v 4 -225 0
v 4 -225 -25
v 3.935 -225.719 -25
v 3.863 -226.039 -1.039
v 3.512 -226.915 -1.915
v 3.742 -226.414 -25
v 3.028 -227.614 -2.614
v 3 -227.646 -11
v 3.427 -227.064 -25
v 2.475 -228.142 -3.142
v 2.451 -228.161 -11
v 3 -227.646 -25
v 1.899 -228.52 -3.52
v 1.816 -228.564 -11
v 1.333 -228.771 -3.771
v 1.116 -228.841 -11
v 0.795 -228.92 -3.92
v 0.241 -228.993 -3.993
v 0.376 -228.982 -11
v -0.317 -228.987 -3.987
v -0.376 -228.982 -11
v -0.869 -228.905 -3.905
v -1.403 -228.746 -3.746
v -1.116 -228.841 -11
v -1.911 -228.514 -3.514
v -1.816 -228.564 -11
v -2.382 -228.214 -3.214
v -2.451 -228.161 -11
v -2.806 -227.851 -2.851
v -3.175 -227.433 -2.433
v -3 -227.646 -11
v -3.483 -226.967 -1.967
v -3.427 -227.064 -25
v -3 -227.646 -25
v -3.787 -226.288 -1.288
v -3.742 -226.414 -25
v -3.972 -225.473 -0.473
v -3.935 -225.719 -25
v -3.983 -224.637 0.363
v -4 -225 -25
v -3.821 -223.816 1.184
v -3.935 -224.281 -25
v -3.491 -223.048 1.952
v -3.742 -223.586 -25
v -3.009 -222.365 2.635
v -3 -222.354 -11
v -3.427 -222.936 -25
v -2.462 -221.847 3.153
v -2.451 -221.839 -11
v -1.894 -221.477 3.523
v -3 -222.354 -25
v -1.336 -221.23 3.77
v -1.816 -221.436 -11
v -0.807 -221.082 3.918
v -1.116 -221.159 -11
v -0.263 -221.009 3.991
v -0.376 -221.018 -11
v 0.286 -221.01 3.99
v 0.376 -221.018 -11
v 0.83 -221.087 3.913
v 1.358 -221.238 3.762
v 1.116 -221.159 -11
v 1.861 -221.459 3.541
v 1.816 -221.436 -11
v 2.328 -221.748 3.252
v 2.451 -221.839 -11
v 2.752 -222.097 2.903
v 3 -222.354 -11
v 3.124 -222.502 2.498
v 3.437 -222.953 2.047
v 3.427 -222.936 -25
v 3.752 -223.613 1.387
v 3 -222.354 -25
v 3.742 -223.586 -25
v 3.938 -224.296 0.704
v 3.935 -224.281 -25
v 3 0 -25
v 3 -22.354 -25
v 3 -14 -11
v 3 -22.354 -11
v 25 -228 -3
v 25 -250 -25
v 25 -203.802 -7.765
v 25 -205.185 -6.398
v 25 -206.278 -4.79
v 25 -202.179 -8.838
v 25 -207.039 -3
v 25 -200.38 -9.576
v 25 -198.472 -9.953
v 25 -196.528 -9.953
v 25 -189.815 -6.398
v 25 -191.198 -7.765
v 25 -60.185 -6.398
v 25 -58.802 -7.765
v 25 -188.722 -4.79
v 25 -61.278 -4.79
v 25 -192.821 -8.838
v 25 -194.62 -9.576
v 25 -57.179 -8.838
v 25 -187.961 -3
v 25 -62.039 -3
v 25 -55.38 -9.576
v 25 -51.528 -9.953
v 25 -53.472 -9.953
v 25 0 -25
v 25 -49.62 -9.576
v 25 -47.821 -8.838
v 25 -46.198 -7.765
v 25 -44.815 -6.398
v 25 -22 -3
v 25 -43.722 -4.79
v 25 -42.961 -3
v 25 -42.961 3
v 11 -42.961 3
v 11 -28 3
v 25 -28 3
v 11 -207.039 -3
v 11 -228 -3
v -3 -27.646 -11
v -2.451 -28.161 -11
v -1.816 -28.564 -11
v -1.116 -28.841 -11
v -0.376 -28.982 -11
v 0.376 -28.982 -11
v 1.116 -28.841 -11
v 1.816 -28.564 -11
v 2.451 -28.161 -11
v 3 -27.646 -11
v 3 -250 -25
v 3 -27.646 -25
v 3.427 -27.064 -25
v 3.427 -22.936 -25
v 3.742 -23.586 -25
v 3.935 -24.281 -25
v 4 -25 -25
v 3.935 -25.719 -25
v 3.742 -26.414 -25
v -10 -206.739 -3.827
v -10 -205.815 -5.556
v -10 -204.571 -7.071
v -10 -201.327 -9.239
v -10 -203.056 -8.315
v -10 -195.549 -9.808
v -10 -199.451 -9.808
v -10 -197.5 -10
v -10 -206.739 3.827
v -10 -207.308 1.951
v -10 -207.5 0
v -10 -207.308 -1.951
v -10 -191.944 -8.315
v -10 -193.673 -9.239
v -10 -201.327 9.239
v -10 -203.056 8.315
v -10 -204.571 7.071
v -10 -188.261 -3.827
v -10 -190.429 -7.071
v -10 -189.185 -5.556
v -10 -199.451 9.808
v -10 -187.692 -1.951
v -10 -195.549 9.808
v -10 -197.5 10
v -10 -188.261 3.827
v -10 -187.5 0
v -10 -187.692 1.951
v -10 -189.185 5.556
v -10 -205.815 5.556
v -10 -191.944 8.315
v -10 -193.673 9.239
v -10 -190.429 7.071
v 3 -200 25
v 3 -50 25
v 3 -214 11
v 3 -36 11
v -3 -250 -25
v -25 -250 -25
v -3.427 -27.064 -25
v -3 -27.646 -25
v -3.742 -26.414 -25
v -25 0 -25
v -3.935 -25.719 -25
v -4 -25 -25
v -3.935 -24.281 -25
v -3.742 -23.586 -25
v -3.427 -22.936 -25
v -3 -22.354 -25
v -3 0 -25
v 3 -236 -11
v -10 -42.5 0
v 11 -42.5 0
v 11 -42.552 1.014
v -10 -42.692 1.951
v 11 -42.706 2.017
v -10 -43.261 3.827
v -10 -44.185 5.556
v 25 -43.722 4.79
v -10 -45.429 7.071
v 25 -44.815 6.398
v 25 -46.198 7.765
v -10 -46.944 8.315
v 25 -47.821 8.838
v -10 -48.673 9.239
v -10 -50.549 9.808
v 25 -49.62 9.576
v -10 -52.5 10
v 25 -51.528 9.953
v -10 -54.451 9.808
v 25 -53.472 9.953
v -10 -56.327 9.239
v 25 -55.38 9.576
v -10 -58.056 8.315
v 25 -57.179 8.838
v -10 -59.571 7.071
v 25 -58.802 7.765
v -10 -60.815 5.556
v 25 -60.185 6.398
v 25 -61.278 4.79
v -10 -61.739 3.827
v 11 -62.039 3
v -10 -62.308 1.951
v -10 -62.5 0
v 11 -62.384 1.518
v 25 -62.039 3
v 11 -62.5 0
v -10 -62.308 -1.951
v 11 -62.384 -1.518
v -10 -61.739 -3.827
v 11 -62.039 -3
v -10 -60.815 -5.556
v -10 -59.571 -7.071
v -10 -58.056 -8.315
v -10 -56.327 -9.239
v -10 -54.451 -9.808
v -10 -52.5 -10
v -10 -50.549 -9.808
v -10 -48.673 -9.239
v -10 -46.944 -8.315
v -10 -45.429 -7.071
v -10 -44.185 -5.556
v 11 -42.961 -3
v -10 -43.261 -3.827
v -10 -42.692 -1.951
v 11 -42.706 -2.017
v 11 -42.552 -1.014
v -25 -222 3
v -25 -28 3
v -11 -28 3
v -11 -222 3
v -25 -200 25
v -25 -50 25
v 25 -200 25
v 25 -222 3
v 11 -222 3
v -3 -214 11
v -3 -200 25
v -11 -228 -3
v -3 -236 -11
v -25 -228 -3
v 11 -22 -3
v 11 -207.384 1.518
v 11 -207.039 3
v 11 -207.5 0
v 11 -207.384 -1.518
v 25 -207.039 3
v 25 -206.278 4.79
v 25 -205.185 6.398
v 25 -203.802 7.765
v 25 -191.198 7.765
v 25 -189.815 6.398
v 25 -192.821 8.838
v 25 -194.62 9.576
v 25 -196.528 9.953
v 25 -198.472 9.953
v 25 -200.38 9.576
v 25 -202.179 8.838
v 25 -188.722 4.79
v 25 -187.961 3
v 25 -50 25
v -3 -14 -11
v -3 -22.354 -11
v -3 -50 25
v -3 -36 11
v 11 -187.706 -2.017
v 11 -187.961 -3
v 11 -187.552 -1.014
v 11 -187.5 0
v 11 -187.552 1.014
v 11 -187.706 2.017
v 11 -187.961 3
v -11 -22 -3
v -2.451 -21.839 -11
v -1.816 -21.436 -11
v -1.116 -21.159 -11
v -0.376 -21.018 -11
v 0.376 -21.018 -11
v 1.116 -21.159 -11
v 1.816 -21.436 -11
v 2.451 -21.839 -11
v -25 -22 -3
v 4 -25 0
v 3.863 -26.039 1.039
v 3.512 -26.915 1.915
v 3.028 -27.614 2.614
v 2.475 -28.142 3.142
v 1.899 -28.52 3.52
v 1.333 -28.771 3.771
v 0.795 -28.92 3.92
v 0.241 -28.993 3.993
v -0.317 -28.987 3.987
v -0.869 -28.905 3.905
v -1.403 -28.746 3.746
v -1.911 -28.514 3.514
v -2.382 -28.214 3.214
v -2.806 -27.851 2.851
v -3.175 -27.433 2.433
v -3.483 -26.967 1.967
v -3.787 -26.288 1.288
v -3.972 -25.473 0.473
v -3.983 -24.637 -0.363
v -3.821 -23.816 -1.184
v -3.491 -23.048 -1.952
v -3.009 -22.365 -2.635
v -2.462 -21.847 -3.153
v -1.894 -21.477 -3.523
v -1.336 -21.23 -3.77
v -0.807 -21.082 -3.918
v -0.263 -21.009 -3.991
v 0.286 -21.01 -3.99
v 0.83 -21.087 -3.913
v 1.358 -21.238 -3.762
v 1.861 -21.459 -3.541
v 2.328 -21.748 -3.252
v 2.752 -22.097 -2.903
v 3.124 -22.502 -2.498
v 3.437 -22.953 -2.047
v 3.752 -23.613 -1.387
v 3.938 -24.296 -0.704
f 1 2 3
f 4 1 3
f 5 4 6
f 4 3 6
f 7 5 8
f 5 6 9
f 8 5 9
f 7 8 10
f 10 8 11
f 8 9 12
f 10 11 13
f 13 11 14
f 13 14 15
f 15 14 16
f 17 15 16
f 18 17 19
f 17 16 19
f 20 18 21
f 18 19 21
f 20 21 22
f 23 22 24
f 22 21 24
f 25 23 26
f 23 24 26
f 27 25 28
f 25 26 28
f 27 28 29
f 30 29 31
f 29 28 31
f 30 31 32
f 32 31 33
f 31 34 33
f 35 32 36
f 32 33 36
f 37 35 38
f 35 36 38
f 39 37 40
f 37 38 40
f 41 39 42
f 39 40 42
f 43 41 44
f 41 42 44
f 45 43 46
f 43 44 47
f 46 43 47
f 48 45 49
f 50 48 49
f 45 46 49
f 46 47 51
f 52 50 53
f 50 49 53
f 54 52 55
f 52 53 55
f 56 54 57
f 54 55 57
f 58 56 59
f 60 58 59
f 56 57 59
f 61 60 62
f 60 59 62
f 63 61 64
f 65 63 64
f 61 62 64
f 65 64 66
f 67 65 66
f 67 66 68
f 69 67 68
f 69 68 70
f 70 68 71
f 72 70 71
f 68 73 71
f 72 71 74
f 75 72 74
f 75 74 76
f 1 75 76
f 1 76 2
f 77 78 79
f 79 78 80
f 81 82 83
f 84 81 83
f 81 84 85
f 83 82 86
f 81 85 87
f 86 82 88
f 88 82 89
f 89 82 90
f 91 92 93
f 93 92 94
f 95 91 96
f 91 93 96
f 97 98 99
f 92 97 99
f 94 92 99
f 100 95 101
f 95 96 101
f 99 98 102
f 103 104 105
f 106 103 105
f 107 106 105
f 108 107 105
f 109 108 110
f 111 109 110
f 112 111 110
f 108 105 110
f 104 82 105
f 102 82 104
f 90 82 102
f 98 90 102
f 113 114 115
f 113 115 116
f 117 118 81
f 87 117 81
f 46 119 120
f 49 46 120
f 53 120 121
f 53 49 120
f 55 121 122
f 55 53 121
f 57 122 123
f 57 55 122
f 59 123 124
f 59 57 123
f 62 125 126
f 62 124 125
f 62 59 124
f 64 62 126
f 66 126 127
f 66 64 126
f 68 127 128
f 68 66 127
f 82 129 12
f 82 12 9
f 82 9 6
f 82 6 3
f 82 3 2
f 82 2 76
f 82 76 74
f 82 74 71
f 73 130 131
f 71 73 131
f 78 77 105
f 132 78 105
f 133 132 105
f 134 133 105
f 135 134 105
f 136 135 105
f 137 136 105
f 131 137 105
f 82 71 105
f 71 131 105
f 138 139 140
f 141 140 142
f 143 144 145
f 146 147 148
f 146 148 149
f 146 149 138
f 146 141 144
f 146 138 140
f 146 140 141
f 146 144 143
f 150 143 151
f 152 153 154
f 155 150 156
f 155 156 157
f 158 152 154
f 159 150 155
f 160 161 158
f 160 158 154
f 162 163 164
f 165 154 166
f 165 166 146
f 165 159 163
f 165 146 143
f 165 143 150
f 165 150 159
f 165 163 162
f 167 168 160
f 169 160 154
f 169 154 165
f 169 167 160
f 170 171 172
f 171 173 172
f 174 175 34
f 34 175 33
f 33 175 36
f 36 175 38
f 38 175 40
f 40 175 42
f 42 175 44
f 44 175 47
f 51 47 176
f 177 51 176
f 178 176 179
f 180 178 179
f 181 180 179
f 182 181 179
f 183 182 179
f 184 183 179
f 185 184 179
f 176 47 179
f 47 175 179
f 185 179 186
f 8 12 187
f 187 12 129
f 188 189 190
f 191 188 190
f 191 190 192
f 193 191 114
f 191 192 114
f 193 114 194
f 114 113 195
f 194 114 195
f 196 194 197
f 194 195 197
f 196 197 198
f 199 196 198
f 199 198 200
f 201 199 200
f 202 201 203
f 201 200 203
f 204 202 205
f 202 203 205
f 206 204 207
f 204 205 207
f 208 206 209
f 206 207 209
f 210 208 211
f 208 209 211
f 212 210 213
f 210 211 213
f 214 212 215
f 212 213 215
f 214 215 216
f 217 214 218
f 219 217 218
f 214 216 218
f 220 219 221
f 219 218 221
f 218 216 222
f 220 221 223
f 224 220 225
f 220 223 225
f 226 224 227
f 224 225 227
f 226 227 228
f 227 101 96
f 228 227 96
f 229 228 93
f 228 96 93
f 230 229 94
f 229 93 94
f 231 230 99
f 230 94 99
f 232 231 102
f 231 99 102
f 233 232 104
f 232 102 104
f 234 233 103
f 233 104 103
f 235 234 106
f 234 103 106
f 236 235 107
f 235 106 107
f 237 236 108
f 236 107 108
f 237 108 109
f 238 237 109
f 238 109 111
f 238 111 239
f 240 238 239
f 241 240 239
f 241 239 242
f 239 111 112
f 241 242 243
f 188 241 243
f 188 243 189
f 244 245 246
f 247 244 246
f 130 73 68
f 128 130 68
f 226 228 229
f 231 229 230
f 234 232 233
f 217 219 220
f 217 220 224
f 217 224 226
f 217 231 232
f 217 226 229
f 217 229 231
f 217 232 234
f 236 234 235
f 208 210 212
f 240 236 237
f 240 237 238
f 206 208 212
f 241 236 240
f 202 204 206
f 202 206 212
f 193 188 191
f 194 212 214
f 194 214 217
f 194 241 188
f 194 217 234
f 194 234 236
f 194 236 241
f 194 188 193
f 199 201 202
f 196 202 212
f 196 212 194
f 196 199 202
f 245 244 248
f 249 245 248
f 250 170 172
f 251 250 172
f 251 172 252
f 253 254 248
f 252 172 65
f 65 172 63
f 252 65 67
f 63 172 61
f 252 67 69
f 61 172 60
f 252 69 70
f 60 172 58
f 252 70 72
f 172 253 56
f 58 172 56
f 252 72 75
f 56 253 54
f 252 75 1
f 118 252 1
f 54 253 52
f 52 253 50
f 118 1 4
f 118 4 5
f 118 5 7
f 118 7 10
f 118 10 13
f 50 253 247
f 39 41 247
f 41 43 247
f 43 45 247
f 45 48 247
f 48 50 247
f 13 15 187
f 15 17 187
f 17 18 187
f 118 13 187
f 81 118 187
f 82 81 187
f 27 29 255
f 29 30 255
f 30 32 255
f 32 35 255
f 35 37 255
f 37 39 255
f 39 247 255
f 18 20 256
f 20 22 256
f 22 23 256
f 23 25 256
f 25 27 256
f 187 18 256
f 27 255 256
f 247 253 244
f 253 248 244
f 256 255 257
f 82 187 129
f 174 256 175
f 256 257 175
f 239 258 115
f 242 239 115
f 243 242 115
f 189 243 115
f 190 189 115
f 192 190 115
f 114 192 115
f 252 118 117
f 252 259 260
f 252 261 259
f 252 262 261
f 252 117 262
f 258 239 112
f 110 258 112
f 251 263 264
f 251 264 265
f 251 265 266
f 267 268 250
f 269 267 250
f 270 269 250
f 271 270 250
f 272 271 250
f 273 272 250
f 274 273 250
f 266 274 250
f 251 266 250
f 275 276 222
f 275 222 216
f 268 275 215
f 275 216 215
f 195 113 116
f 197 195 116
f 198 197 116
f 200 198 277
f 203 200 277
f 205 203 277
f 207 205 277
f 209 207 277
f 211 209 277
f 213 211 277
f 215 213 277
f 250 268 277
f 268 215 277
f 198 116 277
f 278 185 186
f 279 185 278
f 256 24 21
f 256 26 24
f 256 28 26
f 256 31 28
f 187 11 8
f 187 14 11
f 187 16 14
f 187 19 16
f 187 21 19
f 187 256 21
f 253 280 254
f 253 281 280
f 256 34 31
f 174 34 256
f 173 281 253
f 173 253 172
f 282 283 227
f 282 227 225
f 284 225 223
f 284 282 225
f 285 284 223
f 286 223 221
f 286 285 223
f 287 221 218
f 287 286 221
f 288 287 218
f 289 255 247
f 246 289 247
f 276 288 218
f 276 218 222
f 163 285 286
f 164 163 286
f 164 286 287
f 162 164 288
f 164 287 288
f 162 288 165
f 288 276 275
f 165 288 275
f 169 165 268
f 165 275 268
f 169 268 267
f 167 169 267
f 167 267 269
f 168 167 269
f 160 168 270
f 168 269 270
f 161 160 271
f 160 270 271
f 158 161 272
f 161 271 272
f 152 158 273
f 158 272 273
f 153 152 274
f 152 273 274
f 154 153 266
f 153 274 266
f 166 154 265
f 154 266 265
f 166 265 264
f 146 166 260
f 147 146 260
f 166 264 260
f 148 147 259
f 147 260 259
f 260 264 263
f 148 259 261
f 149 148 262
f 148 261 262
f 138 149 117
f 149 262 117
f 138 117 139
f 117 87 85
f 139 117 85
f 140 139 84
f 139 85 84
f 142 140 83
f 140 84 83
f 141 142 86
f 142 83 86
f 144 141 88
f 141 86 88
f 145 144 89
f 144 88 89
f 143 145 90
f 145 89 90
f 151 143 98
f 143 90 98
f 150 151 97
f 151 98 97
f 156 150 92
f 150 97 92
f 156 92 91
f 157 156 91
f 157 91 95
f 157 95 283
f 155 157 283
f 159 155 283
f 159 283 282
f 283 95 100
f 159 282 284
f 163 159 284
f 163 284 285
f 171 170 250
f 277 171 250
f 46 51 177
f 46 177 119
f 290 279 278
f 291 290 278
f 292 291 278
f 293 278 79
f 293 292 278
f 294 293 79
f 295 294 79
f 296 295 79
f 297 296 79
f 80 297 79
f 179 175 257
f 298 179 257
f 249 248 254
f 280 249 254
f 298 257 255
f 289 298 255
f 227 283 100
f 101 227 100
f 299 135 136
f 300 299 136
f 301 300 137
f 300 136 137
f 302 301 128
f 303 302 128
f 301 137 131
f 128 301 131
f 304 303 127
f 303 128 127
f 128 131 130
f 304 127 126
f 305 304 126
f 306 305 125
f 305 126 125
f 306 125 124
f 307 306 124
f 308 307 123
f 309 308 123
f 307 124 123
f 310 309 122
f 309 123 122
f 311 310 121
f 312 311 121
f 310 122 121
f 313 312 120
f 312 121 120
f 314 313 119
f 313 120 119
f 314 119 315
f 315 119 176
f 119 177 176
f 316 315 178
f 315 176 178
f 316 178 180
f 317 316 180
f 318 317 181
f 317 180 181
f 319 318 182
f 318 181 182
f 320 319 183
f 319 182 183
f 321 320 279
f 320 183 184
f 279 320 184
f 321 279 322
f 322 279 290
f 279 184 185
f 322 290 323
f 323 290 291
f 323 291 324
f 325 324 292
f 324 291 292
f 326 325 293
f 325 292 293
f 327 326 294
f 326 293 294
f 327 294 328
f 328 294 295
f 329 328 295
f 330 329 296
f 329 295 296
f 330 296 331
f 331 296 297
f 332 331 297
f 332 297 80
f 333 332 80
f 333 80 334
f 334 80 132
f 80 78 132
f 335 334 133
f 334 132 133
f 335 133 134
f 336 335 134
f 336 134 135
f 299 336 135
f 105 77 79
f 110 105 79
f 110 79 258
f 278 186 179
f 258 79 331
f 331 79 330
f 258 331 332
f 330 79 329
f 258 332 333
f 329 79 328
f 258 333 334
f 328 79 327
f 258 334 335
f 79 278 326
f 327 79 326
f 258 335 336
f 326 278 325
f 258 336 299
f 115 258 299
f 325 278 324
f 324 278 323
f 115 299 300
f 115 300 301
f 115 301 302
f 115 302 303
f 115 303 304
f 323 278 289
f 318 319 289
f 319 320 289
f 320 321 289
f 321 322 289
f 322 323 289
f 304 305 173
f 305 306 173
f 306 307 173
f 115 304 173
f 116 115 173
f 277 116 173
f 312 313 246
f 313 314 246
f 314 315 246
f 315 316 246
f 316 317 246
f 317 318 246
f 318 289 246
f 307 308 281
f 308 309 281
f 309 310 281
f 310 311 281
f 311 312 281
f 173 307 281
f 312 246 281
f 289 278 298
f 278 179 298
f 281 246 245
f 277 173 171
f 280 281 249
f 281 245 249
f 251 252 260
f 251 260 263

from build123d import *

# Parameters (mm, degrees)
F0_W      = 50
F0_H      = 50
F1_DEPTH  = 250
F3_R      = 4
F4_DEPTH  = 50.001
F5_W      = 6
F5_H      = 14
F5_W_2    = 14
F5_H_2    = 6
F6_DEPTH  = 250.001
F8_DEPTH  = 50.001
F9_R      = 10
F10_DEPTH = 35


with BuildPart() as f1:
    # F0 (on Front) → F1 (new body)
    with BuildSketch(Plane.XZ):
        Rectangle(F0_W, F0_H)
    extrude(amount=F1_DEPTH)

    # F3 (on face) → F4 (cut, through all)
    with BuildSketch(Plane(origin=(0, 0, -25), x_dir=(1, 0, 0), z_dir=(0, 0, -1))):
        with Locations((0, 825)):
            Circle(F3_R)
        with Locations((0, 625)):
            Circle(F3_R)
        with Locations((0, 425)):
            Circle(F3_R)
        with Locations((0, 225)):
            Circle(F3_R)
        with Locations((0, 25)):
            Circle(F3_R)
        with Locations((0, -175)):
            Circle(F3_R)
        with Locations((0, -375)):
            Circle(F3_R)
        with Locations((0, -575)):
            Circle(F3_R)
    extrude(amount=-F4_DEPTH, mode=Mode.SUBTRACT)

    # F5 (on face) → F6 (cut, through all)
    with BuildSketch(Plane.XZ.offset(250)):
        with Locations((0, 18)):
            Rectangle(F5_W, F5_H)
        with Locations((0, -18)):
            Rectangle(F5_W, F5_H)
        with Locations((-18, 50)):
            Rectangle(F5_W_2, F5_H_2)
        with Locations((-18, 0)):
            Rectangle(F5_W_2, F5_H_2)
        with Locations((-18, -50)):
            Rectangle(F5_W_2, F5_H_2)
        with Locations((18, 50)):
            Rectangle(F5_W_2, F5_H_2)
        with Locations((18, 0)):
            Rectangle(F5_W_2, F5_H_2)
        with Locations((18, -50)):
            Rectangle(F5_W_2, F5_H_2)
    extrude(amount=-F6_DEPTH, mode=Mode.SUBTRACT)

    # F7 (on face) → F8 (cut, through all)
    with BuildSketch(Plane(origin=(-25, 0, 0), x_dir=(0, -1, 0), z_dir=(-1, 0, 0))):
        Polygon((50, 25), (0, 25), (0, -25), align=None)
        Polygon((250, 25), (200, 25), (250, -25), align=None)
    extrude(amount=-F8_DEPTH, mode=Mode.SUBTRACT)

    # F9 (on face) → F10 (cut)
    with BuildSketch(Plane.YZ.offset(25)):
        with Locations((-197.5, 0)):
            Circle(F9_R)
        with Locations((-52.5, 0)):
            Circle(F9_R)
    extrude(amount=-F10_DEPTH, mode=Mode.SUBTRACT)


solid = f1.part
